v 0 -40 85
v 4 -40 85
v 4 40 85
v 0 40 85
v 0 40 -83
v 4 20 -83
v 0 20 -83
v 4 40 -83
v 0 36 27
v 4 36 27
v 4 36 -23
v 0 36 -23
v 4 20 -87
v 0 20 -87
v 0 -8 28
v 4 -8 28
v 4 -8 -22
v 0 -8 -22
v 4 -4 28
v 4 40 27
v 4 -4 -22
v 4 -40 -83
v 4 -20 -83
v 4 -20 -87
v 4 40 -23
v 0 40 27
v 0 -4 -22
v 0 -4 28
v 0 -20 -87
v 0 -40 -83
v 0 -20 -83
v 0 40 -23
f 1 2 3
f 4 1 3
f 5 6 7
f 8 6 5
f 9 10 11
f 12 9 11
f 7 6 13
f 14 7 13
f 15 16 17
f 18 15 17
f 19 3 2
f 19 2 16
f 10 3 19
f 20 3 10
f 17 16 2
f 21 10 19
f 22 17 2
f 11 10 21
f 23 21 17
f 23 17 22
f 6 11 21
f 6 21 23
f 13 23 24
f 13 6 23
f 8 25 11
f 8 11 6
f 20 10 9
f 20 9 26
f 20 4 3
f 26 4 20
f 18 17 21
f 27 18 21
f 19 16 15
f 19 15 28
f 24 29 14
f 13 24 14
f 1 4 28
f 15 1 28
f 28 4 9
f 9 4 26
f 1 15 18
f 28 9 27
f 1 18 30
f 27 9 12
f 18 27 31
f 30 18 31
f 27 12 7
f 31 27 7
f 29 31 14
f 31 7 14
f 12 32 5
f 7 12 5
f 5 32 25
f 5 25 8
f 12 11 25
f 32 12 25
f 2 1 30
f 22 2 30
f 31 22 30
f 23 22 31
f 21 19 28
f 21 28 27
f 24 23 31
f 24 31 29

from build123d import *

# Parameters (mm, degrees)
SKETCH_1_W          = 174
SKETCH_1_H          = 80
EXTRUDE_1_DEPTH     = 4
SKETCH_3_W          = 4
SKETCH_3_H          = 20
CUT_EXTRUDE_1_DEPTH = 4
SKETCH_4_W          = 50
SKETCH_4_H          = 4
CUT_EXTRUDE_2_DEPTH = 4
SKETCH_5_W          = 2
SKETCH_5_H          = 80
CUT_EXTRUDE_3_DEPTH = 10
SKETCH_6_W          = 50
SKETCH_6_H          = 4
CUT_EXTRUDE_4_DEPTH = 4


with BuildPart() as part:
    # 스케치1 → 보스-돌출1 (new body)
    with BuildSketch(Plane(origin=(0, 0, 0), x_dir=(0, 0, -1), z_dir=(1, 0, 0))):
        Rectangle(SKETCH_1_W, SKETCH_1_H)
    extrude(amount=EXTRUDE_1_DEPTH)

    # 스케치3 → 컷-돌출1 (cut)
    with BuildSketch(Plane(origin=(4, 0, 0), x_dir=(0, 0, -1), z_dir=(1, 0, 0))):
        with Locations((85, 30)):
            Rectangle(SKETCH_3_W, SKETCH_3_H)
        with Locations((85, -30)):
            Rectangle(SKETCH_3_W, SKETCH_3_H)
    extrude(amount=-CUT_EXTRUDE_1_DEPTH, mode=Mode.SUBTRACT)

    # 스케치4 → 컷-돌출2 (cut)
    with BuildSketch(Plane(origin=(4, 0, 0), x_dir=(0, 0, -1), z_dir=(1, 0, 0))):
        with Locations((-2, 38)):
            Rectangle(SKETCH_4_W, SKETCH_4_H)
    extrude(amount=-CUT_EXTRUDE_2_DEPTH, mode=Mode.SUBTRACT)

    # 스케치5 → 컷-돌출3 (cut)
    with BuildSketch(Plane(origin=(4, 0, 0), x_dir=(0, 0, -1), z_dir=(1, 0, 0))):
        with Locations((-86, 0)):
            Rectangle(SKETCH_5_W, SKETCH_5_H)
    extrude(amount=-CUT_EXTRUDE_3_DEPTH, mode=Mode.SUBTRACT)

    # 스케치6 → 컷-돌출4 (cut)
    with BuildSketch(Plane(origin=(4, 0, 0), x_dir=(0, 0, -1), z_dir=(1, 0, 0))):
        with Locations((-3, -6)):
            Rectangle(SKETCH_6_W, SKETCH_6_H)
    extrude(amount=-CUT_EXTRUDE_4_DEPTH, mode=Mode.SUBTRACT)


solid = part.part
